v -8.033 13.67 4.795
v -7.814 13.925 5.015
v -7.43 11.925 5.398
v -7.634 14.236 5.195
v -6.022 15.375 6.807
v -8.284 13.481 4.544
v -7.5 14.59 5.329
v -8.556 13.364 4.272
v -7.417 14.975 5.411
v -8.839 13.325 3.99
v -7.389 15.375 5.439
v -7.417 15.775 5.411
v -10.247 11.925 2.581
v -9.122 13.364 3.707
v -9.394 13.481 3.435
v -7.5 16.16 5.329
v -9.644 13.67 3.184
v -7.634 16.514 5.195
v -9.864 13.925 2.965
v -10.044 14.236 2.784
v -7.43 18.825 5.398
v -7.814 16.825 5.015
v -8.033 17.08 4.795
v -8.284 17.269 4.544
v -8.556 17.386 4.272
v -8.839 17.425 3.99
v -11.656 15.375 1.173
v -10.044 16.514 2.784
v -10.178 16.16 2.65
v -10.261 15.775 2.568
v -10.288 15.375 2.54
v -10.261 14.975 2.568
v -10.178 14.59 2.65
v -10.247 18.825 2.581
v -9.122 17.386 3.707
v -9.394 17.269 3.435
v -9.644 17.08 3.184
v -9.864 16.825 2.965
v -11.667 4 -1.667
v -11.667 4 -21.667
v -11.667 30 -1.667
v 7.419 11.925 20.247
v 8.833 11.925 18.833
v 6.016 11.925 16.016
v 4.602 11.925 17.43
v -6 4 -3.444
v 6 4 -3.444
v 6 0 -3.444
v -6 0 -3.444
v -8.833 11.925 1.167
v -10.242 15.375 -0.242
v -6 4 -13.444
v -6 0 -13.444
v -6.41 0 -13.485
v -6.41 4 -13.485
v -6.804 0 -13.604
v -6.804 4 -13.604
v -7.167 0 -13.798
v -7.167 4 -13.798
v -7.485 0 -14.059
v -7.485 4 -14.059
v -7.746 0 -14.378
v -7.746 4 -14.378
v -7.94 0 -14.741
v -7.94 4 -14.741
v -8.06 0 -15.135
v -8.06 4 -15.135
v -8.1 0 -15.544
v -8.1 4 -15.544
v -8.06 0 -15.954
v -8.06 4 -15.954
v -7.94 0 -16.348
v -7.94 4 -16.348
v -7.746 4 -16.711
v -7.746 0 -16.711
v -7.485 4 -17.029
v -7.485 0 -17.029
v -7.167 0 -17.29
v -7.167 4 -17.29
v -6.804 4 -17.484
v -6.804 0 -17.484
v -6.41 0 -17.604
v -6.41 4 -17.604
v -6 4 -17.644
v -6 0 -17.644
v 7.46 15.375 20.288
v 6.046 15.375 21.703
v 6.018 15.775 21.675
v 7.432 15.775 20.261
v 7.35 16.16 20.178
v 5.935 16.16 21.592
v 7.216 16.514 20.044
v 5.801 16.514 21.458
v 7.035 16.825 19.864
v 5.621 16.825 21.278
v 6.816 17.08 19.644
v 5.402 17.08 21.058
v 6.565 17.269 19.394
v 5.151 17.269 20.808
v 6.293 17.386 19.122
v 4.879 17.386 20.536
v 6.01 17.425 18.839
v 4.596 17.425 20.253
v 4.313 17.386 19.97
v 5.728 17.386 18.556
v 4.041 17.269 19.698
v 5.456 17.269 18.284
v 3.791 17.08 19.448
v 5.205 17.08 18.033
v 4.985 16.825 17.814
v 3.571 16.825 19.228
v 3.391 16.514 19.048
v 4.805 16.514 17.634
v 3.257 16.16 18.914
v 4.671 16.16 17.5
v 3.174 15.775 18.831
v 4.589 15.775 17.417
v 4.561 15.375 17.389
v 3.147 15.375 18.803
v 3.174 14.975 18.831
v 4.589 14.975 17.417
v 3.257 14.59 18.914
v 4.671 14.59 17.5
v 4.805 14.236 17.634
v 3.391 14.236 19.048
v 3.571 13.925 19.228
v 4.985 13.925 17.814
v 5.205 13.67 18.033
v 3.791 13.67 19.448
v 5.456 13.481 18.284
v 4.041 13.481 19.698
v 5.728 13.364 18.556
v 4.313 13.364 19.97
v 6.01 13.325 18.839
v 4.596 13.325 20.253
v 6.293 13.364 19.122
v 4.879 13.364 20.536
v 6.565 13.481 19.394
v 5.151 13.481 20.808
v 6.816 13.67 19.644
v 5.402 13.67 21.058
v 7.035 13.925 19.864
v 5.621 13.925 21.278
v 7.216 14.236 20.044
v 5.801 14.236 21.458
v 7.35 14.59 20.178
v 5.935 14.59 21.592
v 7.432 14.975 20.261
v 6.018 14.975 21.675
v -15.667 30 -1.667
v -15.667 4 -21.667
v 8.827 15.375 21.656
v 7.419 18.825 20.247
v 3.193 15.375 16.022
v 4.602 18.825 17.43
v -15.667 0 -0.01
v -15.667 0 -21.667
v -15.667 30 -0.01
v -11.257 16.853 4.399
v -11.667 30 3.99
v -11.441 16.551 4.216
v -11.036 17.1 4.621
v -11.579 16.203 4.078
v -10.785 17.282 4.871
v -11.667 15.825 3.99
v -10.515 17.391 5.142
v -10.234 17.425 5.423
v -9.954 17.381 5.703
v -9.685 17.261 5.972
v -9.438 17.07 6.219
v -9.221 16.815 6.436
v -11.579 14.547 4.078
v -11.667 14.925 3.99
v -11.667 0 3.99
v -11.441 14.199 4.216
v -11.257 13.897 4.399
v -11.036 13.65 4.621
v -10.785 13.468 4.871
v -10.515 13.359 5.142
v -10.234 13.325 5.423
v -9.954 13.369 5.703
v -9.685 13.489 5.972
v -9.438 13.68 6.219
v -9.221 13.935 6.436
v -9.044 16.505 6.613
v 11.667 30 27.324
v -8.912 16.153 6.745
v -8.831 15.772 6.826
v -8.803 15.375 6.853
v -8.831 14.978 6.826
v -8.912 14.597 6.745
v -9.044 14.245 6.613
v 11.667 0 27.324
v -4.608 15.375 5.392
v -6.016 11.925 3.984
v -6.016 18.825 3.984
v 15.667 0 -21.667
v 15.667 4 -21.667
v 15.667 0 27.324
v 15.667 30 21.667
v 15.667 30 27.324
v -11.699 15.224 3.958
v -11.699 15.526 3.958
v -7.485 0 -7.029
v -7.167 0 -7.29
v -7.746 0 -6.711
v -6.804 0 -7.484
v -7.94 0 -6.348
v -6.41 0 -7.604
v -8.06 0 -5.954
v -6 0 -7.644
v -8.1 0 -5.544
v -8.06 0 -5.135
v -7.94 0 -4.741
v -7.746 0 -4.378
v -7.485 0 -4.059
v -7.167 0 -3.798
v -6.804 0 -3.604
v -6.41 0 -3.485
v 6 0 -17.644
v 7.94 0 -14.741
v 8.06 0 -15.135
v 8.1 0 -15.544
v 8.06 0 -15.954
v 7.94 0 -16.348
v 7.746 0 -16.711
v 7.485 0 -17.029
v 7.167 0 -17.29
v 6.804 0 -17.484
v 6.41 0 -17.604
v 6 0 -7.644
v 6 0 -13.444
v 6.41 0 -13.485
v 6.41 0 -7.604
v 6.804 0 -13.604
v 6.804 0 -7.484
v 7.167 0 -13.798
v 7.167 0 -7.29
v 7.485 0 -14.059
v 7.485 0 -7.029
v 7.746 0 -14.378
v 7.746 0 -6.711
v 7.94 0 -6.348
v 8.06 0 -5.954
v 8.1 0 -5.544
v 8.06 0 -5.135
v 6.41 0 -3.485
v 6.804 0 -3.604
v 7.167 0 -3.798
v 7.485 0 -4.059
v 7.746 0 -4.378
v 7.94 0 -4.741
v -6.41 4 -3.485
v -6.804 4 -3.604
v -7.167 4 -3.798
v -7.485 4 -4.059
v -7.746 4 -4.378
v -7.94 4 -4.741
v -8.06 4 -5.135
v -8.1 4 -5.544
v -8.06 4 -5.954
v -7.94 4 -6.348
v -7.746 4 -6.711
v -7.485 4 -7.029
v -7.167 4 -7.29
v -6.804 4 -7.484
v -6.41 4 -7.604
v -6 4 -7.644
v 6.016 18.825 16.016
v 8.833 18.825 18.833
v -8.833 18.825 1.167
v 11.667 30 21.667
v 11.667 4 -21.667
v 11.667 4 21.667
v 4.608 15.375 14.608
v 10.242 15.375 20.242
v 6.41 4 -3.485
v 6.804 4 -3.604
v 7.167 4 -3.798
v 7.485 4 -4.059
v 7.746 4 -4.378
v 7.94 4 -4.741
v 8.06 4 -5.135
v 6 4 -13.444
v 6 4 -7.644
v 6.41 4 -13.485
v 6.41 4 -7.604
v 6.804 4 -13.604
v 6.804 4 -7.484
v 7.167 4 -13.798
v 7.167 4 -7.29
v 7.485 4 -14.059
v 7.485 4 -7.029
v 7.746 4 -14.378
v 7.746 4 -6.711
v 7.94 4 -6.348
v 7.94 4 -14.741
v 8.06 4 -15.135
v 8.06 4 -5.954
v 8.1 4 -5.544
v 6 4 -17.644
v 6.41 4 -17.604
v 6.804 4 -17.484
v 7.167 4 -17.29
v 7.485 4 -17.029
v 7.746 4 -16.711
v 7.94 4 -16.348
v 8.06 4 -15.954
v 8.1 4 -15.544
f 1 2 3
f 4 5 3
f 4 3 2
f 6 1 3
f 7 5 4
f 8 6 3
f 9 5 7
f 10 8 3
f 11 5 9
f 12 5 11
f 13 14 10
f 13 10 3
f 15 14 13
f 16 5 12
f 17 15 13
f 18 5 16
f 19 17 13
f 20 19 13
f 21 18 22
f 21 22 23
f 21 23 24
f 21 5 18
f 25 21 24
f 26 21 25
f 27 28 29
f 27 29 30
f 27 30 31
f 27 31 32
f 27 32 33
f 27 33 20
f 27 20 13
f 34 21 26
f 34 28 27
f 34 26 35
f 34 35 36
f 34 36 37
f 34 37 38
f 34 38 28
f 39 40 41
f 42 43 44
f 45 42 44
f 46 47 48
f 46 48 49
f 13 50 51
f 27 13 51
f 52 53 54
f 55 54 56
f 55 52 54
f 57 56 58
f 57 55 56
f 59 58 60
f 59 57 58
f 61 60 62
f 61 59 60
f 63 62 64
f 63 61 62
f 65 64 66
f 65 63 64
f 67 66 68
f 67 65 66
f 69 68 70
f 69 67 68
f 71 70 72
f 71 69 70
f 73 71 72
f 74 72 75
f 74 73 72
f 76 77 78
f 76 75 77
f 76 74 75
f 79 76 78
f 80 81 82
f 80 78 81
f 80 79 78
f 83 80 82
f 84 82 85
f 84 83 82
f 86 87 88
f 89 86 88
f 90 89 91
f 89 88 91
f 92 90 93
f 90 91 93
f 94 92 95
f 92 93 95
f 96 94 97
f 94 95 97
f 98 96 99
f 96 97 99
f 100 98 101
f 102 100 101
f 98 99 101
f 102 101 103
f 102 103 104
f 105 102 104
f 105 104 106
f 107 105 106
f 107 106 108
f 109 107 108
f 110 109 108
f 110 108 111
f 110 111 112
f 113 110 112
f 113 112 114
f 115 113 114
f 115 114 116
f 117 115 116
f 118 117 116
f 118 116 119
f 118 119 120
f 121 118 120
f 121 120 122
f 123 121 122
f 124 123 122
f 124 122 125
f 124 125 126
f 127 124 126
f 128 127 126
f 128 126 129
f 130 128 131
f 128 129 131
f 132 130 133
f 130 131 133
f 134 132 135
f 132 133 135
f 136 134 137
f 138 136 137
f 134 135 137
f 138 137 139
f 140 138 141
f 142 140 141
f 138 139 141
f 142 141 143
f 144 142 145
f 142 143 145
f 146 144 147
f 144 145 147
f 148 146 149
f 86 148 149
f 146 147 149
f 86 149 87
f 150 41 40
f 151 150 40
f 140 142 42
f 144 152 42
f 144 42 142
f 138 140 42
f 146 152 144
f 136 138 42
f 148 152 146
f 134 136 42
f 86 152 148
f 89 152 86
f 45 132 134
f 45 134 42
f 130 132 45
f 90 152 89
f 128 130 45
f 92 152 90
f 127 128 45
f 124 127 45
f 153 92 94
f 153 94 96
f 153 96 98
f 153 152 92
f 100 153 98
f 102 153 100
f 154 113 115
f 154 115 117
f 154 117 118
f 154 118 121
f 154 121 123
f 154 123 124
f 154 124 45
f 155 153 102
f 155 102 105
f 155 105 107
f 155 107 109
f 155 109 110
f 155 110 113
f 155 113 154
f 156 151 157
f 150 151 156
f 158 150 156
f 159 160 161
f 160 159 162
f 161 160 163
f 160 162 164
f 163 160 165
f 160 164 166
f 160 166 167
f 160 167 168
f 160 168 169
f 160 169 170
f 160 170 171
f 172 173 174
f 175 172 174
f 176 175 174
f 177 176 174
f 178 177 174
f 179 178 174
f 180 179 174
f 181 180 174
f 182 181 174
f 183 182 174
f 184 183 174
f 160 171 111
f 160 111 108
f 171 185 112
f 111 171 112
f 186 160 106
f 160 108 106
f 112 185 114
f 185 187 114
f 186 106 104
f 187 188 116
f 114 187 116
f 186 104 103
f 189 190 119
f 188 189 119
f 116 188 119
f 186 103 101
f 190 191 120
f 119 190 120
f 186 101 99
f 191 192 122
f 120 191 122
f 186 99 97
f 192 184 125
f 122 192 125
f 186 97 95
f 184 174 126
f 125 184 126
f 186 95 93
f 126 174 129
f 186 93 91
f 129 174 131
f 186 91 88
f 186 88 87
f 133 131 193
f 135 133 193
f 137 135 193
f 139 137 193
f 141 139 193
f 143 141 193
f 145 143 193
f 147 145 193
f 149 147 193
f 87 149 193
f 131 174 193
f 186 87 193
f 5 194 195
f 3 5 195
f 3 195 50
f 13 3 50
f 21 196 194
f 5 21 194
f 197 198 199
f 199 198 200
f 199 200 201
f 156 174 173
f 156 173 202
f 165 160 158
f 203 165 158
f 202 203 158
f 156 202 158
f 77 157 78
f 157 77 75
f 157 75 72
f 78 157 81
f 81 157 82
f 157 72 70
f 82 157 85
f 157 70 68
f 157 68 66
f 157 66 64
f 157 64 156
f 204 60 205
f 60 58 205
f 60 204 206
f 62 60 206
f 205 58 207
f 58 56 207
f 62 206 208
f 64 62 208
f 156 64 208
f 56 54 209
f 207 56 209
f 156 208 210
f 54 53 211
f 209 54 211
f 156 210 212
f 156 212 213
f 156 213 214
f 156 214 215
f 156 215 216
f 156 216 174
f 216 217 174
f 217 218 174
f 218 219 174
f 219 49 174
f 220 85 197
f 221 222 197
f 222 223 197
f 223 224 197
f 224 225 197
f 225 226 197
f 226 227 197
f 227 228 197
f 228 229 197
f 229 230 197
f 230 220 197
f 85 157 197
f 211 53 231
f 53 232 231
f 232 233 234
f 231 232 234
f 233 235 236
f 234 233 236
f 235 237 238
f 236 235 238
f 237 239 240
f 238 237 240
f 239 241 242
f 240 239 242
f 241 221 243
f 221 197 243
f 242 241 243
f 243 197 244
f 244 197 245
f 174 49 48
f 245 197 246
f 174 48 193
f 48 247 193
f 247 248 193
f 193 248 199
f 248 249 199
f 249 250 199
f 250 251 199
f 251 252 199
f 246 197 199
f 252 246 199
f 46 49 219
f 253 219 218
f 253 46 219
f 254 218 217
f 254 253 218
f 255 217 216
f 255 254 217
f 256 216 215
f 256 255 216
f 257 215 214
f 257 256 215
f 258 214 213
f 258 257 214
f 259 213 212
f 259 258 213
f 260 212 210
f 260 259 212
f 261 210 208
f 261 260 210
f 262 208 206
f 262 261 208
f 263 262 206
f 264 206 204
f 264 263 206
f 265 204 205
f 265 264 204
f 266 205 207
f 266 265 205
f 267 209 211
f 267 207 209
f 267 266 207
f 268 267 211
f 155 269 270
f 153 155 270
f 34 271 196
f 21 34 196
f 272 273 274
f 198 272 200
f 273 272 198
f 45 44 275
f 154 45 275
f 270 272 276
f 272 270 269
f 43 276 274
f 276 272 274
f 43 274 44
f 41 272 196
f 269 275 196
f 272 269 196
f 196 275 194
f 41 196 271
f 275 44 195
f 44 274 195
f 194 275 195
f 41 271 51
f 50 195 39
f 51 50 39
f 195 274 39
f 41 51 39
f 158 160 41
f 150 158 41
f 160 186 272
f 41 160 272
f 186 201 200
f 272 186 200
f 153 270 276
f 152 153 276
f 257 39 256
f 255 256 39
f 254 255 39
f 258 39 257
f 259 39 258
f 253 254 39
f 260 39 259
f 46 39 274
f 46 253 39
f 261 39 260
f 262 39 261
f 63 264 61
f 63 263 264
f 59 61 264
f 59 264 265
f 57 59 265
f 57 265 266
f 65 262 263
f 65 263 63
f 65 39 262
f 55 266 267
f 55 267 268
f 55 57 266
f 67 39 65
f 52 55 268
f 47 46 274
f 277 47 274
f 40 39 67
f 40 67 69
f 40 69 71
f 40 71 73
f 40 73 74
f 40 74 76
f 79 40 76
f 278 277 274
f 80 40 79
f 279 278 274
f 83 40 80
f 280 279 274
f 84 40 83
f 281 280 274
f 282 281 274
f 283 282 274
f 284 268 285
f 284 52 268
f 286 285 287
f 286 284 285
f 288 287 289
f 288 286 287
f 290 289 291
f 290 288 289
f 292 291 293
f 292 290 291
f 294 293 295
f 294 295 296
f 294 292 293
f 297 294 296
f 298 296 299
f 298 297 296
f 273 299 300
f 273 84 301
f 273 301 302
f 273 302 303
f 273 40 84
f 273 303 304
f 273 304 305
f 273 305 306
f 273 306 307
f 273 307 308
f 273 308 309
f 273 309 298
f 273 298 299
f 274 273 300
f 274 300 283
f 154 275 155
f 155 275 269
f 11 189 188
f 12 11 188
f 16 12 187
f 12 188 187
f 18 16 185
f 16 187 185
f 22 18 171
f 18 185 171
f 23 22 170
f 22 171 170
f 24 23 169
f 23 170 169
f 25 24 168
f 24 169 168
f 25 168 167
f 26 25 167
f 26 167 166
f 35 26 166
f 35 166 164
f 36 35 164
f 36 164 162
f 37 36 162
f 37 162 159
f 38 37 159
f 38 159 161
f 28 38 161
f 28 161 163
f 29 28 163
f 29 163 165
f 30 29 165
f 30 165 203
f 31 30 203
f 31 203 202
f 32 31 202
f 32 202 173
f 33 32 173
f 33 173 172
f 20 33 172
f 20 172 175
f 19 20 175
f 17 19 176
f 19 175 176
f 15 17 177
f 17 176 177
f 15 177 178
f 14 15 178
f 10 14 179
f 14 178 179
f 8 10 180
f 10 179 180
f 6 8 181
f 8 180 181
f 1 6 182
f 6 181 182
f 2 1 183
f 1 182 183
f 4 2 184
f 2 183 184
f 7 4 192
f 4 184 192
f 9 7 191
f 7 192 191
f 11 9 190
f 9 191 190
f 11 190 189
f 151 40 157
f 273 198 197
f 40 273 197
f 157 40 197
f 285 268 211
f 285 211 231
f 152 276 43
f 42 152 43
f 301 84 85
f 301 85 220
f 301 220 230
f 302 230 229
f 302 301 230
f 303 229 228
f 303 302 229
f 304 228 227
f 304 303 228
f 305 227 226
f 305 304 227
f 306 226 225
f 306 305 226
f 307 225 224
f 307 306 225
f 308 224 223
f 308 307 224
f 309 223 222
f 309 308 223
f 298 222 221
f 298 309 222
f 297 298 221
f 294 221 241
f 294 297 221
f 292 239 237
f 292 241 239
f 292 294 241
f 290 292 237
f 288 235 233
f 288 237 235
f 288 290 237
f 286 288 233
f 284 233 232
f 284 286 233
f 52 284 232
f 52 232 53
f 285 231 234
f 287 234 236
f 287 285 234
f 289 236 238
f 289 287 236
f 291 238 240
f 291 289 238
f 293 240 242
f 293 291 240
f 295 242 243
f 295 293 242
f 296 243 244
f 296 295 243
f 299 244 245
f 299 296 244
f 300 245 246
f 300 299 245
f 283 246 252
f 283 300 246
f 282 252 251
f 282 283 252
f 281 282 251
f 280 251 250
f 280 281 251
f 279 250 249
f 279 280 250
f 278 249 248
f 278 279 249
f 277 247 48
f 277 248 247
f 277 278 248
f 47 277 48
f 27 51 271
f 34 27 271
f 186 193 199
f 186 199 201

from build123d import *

# Parameters (mm, degrees)
SALIENTE_EXTRUIR1_DEPTH = 4
SALIENTE_EXTRUIR2_DEPTH = 30
SALIENTE_EXTRUIR5_DEPTH = 4
SALIENTE_EXTRUIR7_DEPTH = 4
CORTAR_EXTRUIR2_DEPTH   = 31
CROQUIS13_R             = 2.05
CORTAR_EXTRUIR3_DEPTH   = 4
CORTAR_EXTRUIR4_DEPTH   = 5
CORTAR_EXTRUIR5_DEPTH   = 2


with BuildPart() as part:
    # Croquis1 → Saliente-Extruir1 (new body)
    with BuildSketch(Plane(origin=(0, 0, 0), x_dir=(1, 0, 0), z_dir=(0, 1, 0))):
        Polygon((-11.66726189, 1.66726189), (11.66726189, -21.66726189), (11.66726189, 21.66726189), (-11.66726189, 21.66726189), align=None)
    extrude(amount=SALIENTE_EXTRUIR1_DEPTH)

    # Croquis3 → Saliente-Extruir2 (add)
    with BuildSketch(Plane.XZ):
        Polygon((-11.66726189, -1.66726189), (-11.66726189, 3.98959236), (11.66726189, 27.324116139), (11.66726189, 21.66726189), align=None)
    extrude(amount=-SALIENTE_EXTRUIR2_DEPTH)

    # Croquis7 → Saliente-Extruir5 (add)
    with BuildSketch(Plane(origin=(11.66726189, 0, 0), x_dir=(0, 0, -1), z_dir=(1, 0, 0))):
        Polygon((-21.66726189, 30), (21.66726189, 4), (21.66726189, 0), (-27.324116139, 0), (-27.324116139, 30), align=None)
    extrude(amount=SALIENTE_EXTRUIR5_DEPTH)

    # Croquis10 → Saliente-Extruir7 (add)
    with BuildSketch(Plane.ZY.offset(11.66726189)):
        Polygon((-1.66726189, 30), (-21.66726189, 4), (-21.66726189, 0), (3.98959236, 0), (3.98959236, 30), align=None)
    extrude(amount=SALIENTE_EXTRUIR7_DEPTH)

    # Croquis11 → Cortar-Extruir2 (cut, through all)
    with BuildSketch(Plane(origin=(0, 30, 0), x_dir=(1, 0, 0), z_dir=(0, 1, 0))):
        Polygon((-11.66726189, -3.98959236), (-15.66726189, 0.01040764), (-15.66726189, -3.98959236), align=None)
    extrude(amount=-CORTAR_EXTRUIR2_DEPTH, mode=Mode.SUBTRACT)

    # Croquis13 → Cortar-Extruir3 (cut)
    with BuildSketch(Plane(origin=(-7.828427125, 0, 7.828427125), x_dir=(0.707106781, 0, 0.707106781), z_dir=(-0.707106781, 0, 0.707106781))):
        with Locations((-3.428932188, 15.375)):
            Circle(CROQUIS13_R)
        with Locations((17.571067812, 15.375)):
            Circle(CROQUIS13_R)
    extrude(amount=-CORTAR_EXTRUIR3_DEPTH, mode=Mode.SUBTRACT)

    # Croquis14 → Cortar-Extruir4 (cut, through all)
    with BuildSketch(Plane(origin=(0, 4, 0), x_dir=(1, 0, 0), z_dir=(0, 1, 0))):
        with BuildLine():
            Line((-6, 17.644253814), (6, 17.644253814))
            ThreePointArc((6, 17.644253814), (8.1, 15.544253814), (6, 13.444253814))
            Line((6, 13.444253814), (-6, 13.444253814))
            ThreePointArc((-6, 13.444253814), (-8.1, 15.544253814), (-6, 17.644253814))
        make_face()
        with BuildLine():
            Line((-6, 7.644253814), (6, 7.644253814))
            ThreePointArc((6, 7.644253814), (8.1, 5.544253814), (6, 3.444253814))
            Line((6, 3.444253814), (-6, 3.444253814))
            ThreePointArc((-6, 3.444253814), (-8.1, 5.544253814), (-6, 7.644253814))
        make_face()
    extrude(amount=-CORTAR_EXTRUIR4_DEPTH, mode=Mode.SUBTRACT)

    # Croquis15 → Cortar-Extruir5 (cut)
    with BuildSketch(Plane(origin=(-5, 0, 5), x_dir=(-0.707106781, 0, -0.707106781), z_dir=(0.707106781, 0, -0.707106781))):
        Polygon((-13.587350954, 15.375), (-15.579209383, 18.825), (-19.562926241, 18.825), (-21.554784669, 15.375), (-19.562926241, 11.925), (-15.579209383, 11.925), align=None)
        Polygon((-0.554784669, 15.375), (1.437073759, 11.925), (5.420790617, 11.925), (7.412649046, 15.375), (5.420790617, 18.825), (1.437073759, 18.825), align=None)
    extrude(amount=-CORTAR_EXTRUIR5_DEPTH, mode=Mode.SUBTRACT)


solid = part.part
